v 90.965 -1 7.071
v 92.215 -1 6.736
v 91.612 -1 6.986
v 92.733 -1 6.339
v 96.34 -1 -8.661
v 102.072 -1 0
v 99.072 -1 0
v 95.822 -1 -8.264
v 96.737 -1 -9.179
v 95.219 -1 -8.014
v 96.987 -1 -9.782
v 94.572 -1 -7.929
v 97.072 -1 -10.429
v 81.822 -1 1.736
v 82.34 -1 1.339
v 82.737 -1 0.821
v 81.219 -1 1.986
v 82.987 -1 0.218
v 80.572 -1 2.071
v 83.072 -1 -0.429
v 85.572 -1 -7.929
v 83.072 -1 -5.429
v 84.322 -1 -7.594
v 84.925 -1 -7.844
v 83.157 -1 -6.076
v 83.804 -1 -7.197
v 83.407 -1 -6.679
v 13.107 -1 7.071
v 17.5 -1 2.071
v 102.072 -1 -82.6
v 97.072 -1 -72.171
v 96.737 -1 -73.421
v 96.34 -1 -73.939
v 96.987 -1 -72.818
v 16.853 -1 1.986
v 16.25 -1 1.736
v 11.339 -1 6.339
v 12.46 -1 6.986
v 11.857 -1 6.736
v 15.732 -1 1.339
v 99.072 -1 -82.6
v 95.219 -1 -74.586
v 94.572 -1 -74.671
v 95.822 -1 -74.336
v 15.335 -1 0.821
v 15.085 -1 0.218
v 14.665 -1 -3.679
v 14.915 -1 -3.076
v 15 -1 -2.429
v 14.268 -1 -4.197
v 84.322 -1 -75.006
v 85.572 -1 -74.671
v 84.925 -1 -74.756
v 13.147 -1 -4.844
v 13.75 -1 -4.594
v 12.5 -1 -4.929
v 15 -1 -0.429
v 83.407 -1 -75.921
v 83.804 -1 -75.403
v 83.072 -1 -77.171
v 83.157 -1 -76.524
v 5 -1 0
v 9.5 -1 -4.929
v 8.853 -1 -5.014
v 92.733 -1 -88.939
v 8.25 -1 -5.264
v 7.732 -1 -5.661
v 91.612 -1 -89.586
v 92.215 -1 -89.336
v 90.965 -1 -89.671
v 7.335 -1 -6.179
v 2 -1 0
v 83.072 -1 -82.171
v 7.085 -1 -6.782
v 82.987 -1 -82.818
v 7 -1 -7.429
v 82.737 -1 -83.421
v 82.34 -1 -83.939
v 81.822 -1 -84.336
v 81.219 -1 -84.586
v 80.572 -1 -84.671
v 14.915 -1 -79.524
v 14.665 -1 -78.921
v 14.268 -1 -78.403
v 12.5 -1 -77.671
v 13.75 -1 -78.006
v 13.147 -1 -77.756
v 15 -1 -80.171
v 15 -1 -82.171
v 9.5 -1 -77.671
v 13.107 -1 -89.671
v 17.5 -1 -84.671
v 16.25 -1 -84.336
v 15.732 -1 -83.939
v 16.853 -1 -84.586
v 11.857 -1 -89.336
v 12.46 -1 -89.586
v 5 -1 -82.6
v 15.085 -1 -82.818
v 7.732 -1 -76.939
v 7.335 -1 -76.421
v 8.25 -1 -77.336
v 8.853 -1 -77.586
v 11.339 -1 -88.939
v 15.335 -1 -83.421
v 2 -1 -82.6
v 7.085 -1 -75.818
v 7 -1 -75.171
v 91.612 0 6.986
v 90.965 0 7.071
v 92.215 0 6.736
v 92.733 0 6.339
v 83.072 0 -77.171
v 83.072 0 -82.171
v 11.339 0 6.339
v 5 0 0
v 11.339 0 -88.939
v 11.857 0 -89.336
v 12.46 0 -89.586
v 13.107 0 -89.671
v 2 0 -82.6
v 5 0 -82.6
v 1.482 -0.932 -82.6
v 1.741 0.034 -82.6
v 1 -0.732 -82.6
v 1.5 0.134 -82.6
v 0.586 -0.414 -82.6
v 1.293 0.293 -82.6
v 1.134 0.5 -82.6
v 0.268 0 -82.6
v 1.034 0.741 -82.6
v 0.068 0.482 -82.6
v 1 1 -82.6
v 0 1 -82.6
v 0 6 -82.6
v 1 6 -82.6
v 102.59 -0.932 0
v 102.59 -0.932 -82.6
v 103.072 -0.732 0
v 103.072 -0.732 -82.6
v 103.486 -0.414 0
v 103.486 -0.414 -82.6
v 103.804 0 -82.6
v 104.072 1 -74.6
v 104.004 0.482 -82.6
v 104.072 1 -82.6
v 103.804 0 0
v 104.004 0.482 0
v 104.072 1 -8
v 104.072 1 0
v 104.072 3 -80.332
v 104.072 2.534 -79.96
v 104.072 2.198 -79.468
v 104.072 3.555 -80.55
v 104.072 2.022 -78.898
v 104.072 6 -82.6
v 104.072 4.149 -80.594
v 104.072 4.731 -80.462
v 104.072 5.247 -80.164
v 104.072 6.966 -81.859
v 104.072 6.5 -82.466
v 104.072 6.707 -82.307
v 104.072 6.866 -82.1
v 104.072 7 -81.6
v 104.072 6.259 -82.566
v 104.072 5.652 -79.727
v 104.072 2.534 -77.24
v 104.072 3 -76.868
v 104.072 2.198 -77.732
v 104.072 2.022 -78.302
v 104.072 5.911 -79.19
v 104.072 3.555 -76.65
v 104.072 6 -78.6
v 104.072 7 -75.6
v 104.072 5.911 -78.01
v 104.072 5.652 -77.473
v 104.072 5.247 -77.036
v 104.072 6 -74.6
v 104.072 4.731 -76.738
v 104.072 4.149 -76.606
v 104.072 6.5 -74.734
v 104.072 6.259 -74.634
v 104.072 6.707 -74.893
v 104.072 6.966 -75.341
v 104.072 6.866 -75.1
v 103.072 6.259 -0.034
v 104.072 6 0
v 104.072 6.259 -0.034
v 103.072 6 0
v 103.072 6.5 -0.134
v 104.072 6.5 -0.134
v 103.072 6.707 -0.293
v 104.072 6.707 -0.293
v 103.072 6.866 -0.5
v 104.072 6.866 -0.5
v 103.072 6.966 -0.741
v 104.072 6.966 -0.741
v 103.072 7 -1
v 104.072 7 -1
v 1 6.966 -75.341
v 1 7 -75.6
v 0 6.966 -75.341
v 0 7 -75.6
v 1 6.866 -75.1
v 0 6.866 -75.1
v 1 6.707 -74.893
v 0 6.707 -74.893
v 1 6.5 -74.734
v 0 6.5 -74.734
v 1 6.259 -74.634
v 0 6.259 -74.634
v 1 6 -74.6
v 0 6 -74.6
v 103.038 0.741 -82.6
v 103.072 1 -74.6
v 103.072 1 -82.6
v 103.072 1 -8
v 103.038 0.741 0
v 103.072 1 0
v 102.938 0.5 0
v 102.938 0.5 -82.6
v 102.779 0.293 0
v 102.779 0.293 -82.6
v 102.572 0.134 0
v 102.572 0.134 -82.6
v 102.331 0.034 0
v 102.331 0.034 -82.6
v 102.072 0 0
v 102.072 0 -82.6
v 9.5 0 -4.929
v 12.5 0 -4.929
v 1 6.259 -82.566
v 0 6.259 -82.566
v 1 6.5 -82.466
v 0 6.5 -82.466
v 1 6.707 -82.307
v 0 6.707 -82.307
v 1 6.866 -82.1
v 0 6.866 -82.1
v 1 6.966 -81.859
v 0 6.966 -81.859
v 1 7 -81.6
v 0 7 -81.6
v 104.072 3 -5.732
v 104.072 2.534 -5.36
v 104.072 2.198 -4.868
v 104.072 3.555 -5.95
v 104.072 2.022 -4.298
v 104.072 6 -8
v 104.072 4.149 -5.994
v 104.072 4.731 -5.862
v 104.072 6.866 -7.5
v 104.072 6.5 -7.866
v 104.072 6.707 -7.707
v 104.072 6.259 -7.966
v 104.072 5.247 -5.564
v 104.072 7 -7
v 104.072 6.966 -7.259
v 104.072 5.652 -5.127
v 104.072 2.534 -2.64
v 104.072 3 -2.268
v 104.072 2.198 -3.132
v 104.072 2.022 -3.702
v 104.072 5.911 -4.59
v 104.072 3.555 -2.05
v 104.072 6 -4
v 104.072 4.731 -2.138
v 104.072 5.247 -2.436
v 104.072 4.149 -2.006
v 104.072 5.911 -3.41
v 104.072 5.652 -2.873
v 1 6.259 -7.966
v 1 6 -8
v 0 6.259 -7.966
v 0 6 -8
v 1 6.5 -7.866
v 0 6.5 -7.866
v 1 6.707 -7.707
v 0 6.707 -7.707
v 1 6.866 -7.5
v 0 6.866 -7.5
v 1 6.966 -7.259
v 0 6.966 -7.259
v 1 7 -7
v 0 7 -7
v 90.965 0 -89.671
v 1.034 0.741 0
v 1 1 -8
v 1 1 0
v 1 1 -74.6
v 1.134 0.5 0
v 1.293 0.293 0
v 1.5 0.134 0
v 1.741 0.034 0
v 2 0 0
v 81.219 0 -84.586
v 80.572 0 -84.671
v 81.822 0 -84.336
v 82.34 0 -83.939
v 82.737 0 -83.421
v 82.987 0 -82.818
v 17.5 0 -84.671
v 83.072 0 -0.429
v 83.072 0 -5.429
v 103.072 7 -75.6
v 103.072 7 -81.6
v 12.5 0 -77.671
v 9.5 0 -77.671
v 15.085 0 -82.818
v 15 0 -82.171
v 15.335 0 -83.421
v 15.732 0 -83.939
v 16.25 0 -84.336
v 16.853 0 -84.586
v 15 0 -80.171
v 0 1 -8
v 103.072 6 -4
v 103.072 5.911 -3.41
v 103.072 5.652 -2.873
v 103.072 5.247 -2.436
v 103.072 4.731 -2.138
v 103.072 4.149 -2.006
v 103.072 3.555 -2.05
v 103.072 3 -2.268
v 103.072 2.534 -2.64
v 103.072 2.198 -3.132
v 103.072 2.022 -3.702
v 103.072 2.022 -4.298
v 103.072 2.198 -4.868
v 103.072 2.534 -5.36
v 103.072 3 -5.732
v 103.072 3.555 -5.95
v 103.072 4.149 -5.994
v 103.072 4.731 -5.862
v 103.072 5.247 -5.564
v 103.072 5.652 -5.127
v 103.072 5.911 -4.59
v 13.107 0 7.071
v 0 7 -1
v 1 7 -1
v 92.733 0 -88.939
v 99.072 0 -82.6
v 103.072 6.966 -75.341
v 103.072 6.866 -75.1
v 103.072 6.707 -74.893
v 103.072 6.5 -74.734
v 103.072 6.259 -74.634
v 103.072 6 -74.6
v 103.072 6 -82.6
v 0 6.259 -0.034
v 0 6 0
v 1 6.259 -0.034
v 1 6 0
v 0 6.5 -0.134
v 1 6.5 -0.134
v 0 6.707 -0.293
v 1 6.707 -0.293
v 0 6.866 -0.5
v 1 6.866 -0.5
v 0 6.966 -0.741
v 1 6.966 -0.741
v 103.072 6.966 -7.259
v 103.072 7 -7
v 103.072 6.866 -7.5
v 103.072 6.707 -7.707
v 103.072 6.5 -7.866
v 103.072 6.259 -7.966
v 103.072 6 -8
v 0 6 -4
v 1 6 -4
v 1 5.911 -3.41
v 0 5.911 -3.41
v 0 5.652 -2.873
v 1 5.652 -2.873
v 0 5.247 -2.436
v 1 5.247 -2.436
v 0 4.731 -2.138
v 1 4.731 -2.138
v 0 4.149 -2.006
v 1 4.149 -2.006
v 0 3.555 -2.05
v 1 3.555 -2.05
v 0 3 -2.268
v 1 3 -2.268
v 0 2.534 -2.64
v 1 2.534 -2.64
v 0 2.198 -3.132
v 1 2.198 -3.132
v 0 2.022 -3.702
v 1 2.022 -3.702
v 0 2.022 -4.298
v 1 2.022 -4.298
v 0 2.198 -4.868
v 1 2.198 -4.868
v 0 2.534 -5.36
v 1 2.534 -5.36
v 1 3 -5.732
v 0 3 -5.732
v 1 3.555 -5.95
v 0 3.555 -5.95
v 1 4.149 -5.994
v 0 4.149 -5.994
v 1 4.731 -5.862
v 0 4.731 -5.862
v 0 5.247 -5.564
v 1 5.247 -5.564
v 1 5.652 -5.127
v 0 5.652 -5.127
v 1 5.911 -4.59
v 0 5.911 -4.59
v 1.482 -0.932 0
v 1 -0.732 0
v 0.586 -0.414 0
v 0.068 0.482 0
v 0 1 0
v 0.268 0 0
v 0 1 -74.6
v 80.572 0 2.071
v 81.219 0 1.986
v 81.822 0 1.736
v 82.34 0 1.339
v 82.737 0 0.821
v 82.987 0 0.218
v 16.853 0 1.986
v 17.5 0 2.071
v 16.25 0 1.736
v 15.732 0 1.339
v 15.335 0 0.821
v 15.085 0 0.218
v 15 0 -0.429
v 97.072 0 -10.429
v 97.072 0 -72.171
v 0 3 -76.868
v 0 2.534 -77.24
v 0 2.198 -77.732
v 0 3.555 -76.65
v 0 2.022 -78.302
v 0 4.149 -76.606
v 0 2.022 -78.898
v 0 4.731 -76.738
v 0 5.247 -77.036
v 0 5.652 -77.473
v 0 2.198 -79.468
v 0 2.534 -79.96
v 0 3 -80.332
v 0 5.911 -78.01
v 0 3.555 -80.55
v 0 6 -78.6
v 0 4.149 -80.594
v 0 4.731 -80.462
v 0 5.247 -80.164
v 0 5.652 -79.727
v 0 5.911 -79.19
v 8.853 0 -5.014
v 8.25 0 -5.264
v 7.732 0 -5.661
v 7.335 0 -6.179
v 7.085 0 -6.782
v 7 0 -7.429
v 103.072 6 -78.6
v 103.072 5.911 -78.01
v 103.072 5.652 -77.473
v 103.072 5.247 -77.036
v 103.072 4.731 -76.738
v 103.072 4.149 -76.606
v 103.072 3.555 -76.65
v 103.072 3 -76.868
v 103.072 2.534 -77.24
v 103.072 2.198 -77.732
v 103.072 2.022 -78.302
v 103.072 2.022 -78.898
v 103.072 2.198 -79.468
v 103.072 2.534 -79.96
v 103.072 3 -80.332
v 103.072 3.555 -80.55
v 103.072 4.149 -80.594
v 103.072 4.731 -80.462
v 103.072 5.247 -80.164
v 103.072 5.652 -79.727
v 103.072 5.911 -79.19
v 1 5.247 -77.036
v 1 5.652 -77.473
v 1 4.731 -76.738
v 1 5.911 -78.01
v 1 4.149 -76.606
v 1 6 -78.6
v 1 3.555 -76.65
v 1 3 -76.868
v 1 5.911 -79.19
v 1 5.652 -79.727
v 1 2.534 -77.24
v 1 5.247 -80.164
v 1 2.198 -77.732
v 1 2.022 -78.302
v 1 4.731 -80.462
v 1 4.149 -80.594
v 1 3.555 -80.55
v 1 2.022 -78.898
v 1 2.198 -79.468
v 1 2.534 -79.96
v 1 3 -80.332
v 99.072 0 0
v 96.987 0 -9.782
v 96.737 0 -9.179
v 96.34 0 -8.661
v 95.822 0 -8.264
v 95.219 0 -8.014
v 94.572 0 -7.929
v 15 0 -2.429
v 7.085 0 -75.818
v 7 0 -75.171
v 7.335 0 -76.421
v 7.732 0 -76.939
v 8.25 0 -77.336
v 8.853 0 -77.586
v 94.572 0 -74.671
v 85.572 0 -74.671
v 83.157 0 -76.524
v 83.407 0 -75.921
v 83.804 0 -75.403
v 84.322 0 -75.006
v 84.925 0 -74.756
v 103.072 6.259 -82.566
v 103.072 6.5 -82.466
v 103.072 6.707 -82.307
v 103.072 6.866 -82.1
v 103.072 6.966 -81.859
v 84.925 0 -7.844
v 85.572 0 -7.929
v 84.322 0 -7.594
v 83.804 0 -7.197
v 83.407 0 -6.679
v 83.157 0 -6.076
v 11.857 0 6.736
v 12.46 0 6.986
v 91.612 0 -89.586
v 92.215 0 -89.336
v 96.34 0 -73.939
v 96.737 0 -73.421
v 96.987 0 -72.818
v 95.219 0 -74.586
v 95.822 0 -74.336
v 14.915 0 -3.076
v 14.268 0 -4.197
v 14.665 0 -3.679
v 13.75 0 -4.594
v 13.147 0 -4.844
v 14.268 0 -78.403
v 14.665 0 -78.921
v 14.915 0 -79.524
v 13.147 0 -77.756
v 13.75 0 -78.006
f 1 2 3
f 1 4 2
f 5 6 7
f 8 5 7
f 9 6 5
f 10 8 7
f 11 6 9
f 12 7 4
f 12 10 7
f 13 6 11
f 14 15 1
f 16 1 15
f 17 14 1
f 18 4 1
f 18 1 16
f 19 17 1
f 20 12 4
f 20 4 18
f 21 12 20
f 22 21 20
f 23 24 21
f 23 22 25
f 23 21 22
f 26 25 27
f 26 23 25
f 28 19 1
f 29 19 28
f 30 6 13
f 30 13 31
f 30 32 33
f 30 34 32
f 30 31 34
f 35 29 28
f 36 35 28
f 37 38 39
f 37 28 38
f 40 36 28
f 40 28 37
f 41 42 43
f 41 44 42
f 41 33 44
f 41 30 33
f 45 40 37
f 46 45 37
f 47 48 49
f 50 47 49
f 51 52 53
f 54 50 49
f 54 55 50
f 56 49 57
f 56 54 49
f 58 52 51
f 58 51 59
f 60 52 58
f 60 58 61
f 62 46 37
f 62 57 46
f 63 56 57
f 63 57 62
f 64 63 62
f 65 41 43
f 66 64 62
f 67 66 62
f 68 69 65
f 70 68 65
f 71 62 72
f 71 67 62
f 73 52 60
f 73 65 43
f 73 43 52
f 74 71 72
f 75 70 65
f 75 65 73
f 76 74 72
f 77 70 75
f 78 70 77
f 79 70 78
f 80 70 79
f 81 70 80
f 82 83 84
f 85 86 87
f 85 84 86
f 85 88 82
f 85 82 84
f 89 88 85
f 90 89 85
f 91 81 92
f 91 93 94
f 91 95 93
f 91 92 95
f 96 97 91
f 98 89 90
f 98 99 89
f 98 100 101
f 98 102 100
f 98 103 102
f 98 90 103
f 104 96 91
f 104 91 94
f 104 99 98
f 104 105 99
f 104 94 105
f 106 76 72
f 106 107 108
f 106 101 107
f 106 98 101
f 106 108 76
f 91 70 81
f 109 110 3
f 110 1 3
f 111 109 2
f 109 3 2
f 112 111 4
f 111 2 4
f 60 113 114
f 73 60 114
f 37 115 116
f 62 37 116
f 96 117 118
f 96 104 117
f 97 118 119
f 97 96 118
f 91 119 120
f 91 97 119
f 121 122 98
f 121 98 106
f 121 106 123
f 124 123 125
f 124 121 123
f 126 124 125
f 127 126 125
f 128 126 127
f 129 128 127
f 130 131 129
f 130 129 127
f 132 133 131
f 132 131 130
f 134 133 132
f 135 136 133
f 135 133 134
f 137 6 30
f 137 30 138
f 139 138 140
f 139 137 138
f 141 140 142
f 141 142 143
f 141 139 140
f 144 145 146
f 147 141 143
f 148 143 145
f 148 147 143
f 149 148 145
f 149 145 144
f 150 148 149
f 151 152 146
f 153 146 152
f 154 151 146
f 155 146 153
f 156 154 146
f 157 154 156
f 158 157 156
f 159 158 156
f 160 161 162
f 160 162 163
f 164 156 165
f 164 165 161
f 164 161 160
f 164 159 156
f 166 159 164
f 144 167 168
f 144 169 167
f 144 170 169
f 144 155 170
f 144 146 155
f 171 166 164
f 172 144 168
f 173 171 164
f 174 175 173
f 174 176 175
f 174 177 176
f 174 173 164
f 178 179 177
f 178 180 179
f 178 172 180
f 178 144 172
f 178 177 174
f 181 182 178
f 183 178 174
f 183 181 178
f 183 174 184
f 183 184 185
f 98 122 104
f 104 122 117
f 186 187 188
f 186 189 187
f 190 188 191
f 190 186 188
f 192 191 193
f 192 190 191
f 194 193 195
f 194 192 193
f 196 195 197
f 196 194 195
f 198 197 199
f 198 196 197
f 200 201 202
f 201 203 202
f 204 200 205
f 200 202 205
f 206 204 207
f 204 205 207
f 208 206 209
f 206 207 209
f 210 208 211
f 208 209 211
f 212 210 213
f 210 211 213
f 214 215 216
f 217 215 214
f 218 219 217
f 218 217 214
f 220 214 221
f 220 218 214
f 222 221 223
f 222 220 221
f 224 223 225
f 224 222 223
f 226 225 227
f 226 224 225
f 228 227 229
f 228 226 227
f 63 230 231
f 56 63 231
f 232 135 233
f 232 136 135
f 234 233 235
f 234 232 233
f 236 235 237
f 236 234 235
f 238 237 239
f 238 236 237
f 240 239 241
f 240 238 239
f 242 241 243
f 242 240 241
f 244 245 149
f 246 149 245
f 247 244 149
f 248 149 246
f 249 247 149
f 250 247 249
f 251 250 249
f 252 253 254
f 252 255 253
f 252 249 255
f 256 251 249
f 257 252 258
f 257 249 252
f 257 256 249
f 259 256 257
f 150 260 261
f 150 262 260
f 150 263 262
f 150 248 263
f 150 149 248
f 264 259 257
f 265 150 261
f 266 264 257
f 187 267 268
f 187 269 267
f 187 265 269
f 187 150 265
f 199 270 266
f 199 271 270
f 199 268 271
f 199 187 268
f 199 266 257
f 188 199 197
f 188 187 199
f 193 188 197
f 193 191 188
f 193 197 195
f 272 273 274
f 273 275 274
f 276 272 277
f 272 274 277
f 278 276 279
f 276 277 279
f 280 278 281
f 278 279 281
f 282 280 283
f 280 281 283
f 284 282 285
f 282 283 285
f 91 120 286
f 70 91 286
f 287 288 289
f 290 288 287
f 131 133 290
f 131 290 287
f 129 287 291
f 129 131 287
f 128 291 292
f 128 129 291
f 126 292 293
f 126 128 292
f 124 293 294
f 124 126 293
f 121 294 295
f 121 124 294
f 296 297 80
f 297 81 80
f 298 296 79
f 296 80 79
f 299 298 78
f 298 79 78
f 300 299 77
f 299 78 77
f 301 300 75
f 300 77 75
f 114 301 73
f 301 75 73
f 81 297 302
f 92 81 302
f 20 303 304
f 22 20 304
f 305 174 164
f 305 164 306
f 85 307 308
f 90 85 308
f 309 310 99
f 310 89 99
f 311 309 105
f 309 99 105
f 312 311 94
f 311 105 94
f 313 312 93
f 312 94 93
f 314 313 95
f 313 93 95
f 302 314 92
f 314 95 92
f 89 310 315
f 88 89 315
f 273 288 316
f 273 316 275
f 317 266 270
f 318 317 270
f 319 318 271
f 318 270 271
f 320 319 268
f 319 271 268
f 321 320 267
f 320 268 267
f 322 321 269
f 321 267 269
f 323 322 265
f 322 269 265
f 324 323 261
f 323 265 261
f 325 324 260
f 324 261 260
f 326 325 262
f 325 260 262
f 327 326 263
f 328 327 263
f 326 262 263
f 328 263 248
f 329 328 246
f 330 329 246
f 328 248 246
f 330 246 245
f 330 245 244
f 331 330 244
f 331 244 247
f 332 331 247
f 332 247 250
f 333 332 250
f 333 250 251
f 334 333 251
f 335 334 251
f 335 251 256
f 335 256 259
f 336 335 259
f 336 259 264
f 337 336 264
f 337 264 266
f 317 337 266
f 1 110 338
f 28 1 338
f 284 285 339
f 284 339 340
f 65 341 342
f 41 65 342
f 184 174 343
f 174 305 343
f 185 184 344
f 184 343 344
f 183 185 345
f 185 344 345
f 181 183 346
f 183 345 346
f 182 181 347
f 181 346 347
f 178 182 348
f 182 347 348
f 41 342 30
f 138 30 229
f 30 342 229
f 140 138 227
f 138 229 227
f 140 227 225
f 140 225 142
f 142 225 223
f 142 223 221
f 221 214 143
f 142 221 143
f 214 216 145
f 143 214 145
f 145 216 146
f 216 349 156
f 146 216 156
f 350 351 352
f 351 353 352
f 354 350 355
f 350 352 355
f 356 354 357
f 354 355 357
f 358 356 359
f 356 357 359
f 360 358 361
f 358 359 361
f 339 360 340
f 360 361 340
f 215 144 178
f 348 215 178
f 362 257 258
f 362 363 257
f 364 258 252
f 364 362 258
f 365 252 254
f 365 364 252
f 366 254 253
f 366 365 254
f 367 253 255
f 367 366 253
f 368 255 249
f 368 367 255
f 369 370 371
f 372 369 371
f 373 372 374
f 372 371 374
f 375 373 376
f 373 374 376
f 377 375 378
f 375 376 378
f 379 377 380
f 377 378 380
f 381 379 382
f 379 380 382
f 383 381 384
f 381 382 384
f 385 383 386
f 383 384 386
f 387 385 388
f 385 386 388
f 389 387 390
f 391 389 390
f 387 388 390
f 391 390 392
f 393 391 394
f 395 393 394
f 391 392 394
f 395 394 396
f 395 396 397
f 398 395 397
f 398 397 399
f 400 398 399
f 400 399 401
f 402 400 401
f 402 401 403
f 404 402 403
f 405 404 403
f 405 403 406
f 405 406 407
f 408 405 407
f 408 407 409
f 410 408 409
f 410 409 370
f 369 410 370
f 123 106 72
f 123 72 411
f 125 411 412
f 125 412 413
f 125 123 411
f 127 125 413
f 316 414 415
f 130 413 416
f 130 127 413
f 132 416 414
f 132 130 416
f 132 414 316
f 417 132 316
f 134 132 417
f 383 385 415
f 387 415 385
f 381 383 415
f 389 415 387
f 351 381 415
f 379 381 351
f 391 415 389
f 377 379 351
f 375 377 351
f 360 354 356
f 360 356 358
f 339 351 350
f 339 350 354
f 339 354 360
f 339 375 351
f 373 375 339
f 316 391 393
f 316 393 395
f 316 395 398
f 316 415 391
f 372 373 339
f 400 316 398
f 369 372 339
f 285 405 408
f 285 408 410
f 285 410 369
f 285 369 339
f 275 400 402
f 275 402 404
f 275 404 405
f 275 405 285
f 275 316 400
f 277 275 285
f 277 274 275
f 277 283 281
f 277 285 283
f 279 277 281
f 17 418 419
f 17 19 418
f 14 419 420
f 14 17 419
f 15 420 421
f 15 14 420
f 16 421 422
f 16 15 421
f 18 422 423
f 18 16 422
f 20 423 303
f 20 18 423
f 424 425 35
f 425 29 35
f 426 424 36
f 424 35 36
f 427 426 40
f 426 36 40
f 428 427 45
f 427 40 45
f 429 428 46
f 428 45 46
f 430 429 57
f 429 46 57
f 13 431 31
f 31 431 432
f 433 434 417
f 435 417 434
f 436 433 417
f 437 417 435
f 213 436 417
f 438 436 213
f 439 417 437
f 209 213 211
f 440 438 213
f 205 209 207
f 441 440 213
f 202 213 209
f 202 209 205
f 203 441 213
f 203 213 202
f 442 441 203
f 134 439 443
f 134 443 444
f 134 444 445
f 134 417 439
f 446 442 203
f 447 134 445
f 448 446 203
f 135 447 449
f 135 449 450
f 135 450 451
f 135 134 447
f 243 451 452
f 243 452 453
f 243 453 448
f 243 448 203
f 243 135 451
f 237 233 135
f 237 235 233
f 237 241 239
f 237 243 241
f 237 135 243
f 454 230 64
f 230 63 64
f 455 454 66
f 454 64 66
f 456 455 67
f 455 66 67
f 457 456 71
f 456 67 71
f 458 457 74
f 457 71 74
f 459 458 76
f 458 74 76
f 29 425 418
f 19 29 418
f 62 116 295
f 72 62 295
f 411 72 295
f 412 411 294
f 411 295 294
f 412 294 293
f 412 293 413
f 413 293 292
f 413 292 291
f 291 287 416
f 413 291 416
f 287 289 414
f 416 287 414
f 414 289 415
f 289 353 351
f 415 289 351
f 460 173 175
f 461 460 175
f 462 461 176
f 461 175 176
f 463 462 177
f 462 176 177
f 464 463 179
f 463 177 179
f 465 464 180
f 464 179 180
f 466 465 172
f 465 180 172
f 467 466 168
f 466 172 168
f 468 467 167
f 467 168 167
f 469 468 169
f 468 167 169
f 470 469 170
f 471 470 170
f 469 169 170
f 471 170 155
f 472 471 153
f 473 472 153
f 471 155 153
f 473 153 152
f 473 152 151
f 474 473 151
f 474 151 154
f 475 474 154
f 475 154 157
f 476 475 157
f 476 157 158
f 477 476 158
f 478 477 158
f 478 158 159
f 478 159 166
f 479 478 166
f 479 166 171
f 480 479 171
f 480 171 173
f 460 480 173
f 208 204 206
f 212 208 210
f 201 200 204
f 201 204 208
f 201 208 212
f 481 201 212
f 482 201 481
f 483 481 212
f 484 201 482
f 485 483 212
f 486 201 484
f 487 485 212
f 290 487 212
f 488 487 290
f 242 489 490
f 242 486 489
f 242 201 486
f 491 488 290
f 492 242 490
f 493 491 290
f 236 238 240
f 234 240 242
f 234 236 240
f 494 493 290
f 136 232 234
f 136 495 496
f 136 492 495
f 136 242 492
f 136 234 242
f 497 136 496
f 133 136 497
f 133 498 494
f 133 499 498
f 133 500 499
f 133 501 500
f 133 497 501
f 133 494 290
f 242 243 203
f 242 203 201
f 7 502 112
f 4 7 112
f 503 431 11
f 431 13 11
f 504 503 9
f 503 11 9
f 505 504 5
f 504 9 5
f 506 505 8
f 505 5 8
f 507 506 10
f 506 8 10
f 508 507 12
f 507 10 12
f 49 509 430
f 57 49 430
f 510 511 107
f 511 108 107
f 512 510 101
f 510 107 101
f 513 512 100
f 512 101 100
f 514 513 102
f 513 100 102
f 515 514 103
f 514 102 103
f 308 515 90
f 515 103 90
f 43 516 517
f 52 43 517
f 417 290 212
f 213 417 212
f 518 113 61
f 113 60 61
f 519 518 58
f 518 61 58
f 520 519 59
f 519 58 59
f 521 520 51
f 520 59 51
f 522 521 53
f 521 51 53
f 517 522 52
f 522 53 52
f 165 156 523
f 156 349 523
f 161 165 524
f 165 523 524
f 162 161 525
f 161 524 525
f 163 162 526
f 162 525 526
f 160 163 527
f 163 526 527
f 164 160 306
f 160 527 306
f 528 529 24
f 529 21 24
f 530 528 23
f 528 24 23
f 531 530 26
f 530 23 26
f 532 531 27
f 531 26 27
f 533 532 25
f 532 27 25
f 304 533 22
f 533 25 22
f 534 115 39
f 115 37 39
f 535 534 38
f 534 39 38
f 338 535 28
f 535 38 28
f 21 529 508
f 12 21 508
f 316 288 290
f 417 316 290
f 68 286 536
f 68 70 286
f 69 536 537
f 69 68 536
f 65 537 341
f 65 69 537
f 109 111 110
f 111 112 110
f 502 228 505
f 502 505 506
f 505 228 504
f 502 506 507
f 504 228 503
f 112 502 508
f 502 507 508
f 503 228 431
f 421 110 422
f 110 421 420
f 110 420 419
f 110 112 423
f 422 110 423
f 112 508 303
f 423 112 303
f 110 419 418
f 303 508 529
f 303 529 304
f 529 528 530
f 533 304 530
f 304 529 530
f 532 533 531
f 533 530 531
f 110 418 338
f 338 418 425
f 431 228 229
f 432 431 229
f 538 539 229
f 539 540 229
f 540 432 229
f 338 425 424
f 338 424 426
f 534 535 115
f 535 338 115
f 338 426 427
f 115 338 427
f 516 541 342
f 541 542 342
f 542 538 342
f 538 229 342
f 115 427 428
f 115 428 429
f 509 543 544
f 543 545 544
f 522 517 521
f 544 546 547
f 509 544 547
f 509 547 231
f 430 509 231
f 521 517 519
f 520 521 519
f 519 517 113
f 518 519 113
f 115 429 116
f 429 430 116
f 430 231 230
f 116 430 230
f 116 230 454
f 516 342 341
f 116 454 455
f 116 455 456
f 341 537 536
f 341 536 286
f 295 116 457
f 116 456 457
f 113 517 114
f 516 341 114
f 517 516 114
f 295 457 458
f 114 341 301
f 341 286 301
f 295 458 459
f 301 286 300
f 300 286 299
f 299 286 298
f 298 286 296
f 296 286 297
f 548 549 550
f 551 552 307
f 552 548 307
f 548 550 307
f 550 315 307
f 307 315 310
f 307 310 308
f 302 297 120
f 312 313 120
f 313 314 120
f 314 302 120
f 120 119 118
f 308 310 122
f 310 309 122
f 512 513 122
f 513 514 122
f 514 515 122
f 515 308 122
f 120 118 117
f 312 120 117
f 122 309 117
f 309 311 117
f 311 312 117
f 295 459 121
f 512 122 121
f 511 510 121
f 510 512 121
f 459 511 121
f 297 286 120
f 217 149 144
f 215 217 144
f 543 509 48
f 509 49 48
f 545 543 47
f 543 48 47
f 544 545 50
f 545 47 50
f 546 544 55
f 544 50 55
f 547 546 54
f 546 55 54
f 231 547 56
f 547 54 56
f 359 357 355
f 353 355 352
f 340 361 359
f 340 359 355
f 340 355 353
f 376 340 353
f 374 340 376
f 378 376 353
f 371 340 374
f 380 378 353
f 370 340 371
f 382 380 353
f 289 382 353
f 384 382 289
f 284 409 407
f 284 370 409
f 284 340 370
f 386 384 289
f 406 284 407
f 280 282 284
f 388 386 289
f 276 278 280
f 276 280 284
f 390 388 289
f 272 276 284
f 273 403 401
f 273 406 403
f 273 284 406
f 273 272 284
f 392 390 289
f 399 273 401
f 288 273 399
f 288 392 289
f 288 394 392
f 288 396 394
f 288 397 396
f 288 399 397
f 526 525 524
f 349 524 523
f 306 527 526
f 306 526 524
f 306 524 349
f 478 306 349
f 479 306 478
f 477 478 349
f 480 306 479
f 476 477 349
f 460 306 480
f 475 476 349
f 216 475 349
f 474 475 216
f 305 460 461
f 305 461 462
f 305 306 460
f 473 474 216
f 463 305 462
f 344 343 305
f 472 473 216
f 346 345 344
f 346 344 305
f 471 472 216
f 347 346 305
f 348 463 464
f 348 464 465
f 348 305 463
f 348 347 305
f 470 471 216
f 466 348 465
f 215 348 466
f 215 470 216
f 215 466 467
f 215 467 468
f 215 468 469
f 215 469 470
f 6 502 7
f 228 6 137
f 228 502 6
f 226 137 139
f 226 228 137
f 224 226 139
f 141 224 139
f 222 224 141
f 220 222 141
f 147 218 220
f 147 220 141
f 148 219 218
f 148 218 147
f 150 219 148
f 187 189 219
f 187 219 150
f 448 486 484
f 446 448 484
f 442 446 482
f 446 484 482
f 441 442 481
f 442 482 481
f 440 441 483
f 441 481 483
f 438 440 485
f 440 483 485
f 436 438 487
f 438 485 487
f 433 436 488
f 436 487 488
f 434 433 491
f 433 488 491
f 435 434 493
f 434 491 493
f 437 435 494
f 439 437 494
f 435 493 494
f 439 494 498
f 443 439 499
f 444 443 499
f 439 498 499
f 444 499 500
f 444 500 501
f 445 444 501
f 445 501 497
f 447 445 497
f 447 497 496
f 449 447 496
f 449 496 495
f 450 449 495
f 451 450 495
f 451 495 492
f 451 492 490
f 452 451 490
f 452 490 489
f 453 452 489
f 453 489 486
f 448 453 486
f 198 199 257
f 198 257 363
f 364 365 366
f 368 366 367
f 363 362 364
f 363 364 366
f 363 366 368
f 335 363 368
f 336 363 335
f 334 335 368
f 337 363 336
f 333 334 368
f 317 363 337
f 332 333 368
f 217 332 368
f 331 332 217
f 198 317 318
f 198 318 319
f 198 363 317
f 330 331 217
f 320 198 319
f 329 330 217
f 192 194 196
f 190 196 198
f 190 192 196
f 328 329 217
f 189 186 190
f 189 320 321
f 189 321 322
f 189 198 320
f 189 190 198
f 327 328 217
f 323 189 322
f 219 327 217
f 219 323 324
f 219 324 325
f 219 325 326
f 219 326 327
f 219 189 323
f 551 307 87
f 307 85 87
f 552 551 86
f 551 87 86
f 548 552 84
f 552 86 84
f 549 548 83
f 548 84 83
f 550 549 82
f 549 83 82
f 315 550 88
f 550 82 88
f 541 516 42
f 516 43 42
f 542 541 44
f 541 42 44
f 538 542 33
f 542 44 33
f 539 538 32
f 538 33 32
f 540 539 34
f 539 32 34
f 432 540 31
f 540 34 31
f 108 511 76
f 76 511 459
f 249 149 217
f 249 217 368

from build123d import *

# Parameters (mm, degrees)
BASE_FLANGE2_DEPTH             = 1
EDGE_FLANGE1_STRIP_W           = 6
EDGE_FLANGE1_STRIP_H           = 1
EDGE_FLANGE1_STRIP_CUT_DEPTH   = 82.6
EDGE_FLANGE1_STRIP_2_W         = 6
EDGE_FLANGE1_STRIP_2_H         = 1
EDGE_FLANGE1_STRIP_CUT_2_DEPTH = 82.6
EDGE_FLANGE1_DEPTH             = 82.6
EDGE_FLANGE1_BEND_DEPTH        = 82.6
SKETCH16_W                     = 66.6
SKETCH16_H                     = 7
CUT_EXTRUDE1_DEPTH             = 138.553195479
FILLET1_R                      = 1
SKETCH17_R                     = 2
CUT_EXTRUDE2_DEPTH             = 138.553195479
CUT_EXTRUDE3_DEPTH             = 138.553195479
FILLET2_R                      = 2.5


# Sheet-metal steps are written as plain solids
with BuildPart() as part:
    # Sketch1 → Base-Flange2 (new body)
    with BuildSketch(Plane(origin=(0, 0, 0), x_dir=(1, 0, 0), z_dir=(0, 1, 0))):
        Polygon((0, 0), (0, 82.6), (5, 82.6), (12.071067812, 89.671067812), (92.000932188, 89.671067812), (99.072, 82.6), (104.072, 82.6), (104.072, 0), (99.072, 0), (92.000932188, -7.071067812), (12.071067812, -7.071067812), (5, 0), align=None)
    extrude(amount=-BASE_FLANGE2_DEPTH)

    # Edge-Flange1 strip (across the edge) → Edge-Flange1 strip cut (cut)
    with BuildSketch(Plane(origin=(104.072, 0, 0), x_dir=(-1, 0, 0), z_dir=(0, 0, -1))):
        with Locations((-1, -0.5)):
            Rectangle(EDGE_FLANGE1_STRIP_W, EDGE_FLANGE1_STRIP_H)
    extrude(amount=EDGE_FLANGE1_STRIP_CUT_DEPTH, mode=Mode.SUBTRACT)

    # Edge-Flange1 strip 2 (across the edge) → Edge-Flange1 strip cut 2 (cut)
    with BuildSketch(Plane.XY.offset(-82.6)):
        with Locations((-1, -0.5)):
            Rectangle(EDGE_FLANGE1_STRIP_2_W, EDGE_FLANGE1_STRIP_2_H)
    extrude(amount=EDGE_FLANGE1_STRIP_CUT_2_DEPTH, mode=Mode.SUBTRACT)

    # Edge-Flange1 section (across the edge) → Edge-Flange1 (add)
    with BuildSketch(Plane(origin=(104.072, 0, 0), x_dir=(-1, 0, 0), z_dir=(0, 0, -1))):
        with BuildLine():
            Line((0, 1), (0, 7))
            Line((0, 7), (1, 7))
            Line((1, 7), (1, 1))
            ThreePointArc((1, 1), (1.292893219, 0.292893219), (2, 0))
            Line((2, 0), (2, -1))
            ThreePointArc((2, -1), (0.585786438, -0.414213562), (0, 1))
        make_face()
    extrude(amount=EDGE_FLANGE1_DEPTH)

    # Edge-Flange1 section 2 (across the edge) → Edge-Flange1 bend (add)
    with BuildSketch(Plane.XY.offset(-82.6)):
        with BuildLine():
            Line((0, 1), (0, 7))
            Line((0, 7), (1, 7))
            Line((1, 7), (1, 1))
            ThreePointArc((1, 1), (1.292893219, 0.292893219), (2, 0))
            Line((2, 0), (2, -1))
            ThreePointArc((2, -1), (0.585786438, -0.414213562), (0, 1))
        make_face()
    extrude(amount=EDGE_FLANGE1_BEND_DEPTH)

    # Sketch16 → Cut-Extrude1 (cut, through all)
    with BuildSketch(Plane(origin=(104.072, 0, 0), x_dir=(0, 0, -1), z_dir=(1, 0, 0))):
        with Locations((41.3, 4.5)):
            Rectangle(SKETCH16_W, SKETCH16_H)
    extrude(amount=-CUT_EXTRUDE1_DEPTH, mode=Mode.SUBTRACT)

    # Fillet1
    fillet1_edges = [part.edges().sort_by_distance(p)[0] for p in [
        (0.5, 7, -74.6),
        (0.5, 7, -8),
        (103.572, 7, -8),
        (103.572, 7, -74.6),
        (103.572, 7, 0),
        (103.572, 7, -82.6),
        (0.5, 7, -82.6),
        (0.5, 7, 0),
    ]]
    fillet(fillet1_edges, radius=FILLET1_R)

    # Sketch17 → Cut-Extrude2 (cut, through all)
    with BuildSketch(Plane(origin=(104.072, 0, 0), x_dir=(0, 0, -1), z_dir=(1, 0, 0))):
        with Locations(Location((4, 4, 0), (0, 0, 90))):
            Circle(SKETCH17_R)
        with Locations(Location((78.6, 4, 0), (0, 0, 90))):
            Circle(SKETCH17_R)
    extrude(amount=-CUT_EXTRUDE2_DEPTH, mode=Mode.SUBTRACT)

    # Sketch19 → Cut-Extrude3 (cut, through all)
    with BuildSketch(Plane(origin=(0, 0, 0), x_dir=(1, 0, 0), z_dir=(0, 1, 0))):
        Polygon((15, -2.071067812), (83.072, -2.071067812), (83.072, 7.928932188), (97.072, 7.928932188), (97.072, 74.671067812), (83.072, 74.671067812), (83.072, 84.671067812), (15, 84.671067812), (15, 77.671067812), (7, 77.671067812), (7, 4.928932188), (15, 4.928932188), align=None)
    extrude(amount=-CUT_EXTRUDE3_DEPTH, mode=Mode.SUBTRACT)

    # Fillet2
    fillet2_edges = [part.edges().sort_by_distance(p)[0] for p in [
        (12.071067812, -0.5, -89.671067812),
        (92.000932188, -0.5, -89.671067812),
        (92.000932188, -0.5, 7.071067812),
        (12.071067812, -0.5, 7.071067812),
        (15, -0.5, 2.071067812),
        (15, -0.5, -4.928932188),
        (7, -0.5, -4.928932188),
        (7, -0.5, -77.671067812),
        (15, -0.5, -77.671067812),
        (15, -0.5, -84.671067812),
        (83.072, -0.5, -84.671067812),
        (83.072, -0.5, -74.671067812),
        (97.072, -0.5, -74.671067812),
        (97.072, -0.5, -7.928932188),
        (83.072, -0.5, -7.928932188),
        (83.072, -0.5, 2.071067812),
    ]]
    fillet(fillet2_edges, radius=FILLET2_R)


solid = part.part
